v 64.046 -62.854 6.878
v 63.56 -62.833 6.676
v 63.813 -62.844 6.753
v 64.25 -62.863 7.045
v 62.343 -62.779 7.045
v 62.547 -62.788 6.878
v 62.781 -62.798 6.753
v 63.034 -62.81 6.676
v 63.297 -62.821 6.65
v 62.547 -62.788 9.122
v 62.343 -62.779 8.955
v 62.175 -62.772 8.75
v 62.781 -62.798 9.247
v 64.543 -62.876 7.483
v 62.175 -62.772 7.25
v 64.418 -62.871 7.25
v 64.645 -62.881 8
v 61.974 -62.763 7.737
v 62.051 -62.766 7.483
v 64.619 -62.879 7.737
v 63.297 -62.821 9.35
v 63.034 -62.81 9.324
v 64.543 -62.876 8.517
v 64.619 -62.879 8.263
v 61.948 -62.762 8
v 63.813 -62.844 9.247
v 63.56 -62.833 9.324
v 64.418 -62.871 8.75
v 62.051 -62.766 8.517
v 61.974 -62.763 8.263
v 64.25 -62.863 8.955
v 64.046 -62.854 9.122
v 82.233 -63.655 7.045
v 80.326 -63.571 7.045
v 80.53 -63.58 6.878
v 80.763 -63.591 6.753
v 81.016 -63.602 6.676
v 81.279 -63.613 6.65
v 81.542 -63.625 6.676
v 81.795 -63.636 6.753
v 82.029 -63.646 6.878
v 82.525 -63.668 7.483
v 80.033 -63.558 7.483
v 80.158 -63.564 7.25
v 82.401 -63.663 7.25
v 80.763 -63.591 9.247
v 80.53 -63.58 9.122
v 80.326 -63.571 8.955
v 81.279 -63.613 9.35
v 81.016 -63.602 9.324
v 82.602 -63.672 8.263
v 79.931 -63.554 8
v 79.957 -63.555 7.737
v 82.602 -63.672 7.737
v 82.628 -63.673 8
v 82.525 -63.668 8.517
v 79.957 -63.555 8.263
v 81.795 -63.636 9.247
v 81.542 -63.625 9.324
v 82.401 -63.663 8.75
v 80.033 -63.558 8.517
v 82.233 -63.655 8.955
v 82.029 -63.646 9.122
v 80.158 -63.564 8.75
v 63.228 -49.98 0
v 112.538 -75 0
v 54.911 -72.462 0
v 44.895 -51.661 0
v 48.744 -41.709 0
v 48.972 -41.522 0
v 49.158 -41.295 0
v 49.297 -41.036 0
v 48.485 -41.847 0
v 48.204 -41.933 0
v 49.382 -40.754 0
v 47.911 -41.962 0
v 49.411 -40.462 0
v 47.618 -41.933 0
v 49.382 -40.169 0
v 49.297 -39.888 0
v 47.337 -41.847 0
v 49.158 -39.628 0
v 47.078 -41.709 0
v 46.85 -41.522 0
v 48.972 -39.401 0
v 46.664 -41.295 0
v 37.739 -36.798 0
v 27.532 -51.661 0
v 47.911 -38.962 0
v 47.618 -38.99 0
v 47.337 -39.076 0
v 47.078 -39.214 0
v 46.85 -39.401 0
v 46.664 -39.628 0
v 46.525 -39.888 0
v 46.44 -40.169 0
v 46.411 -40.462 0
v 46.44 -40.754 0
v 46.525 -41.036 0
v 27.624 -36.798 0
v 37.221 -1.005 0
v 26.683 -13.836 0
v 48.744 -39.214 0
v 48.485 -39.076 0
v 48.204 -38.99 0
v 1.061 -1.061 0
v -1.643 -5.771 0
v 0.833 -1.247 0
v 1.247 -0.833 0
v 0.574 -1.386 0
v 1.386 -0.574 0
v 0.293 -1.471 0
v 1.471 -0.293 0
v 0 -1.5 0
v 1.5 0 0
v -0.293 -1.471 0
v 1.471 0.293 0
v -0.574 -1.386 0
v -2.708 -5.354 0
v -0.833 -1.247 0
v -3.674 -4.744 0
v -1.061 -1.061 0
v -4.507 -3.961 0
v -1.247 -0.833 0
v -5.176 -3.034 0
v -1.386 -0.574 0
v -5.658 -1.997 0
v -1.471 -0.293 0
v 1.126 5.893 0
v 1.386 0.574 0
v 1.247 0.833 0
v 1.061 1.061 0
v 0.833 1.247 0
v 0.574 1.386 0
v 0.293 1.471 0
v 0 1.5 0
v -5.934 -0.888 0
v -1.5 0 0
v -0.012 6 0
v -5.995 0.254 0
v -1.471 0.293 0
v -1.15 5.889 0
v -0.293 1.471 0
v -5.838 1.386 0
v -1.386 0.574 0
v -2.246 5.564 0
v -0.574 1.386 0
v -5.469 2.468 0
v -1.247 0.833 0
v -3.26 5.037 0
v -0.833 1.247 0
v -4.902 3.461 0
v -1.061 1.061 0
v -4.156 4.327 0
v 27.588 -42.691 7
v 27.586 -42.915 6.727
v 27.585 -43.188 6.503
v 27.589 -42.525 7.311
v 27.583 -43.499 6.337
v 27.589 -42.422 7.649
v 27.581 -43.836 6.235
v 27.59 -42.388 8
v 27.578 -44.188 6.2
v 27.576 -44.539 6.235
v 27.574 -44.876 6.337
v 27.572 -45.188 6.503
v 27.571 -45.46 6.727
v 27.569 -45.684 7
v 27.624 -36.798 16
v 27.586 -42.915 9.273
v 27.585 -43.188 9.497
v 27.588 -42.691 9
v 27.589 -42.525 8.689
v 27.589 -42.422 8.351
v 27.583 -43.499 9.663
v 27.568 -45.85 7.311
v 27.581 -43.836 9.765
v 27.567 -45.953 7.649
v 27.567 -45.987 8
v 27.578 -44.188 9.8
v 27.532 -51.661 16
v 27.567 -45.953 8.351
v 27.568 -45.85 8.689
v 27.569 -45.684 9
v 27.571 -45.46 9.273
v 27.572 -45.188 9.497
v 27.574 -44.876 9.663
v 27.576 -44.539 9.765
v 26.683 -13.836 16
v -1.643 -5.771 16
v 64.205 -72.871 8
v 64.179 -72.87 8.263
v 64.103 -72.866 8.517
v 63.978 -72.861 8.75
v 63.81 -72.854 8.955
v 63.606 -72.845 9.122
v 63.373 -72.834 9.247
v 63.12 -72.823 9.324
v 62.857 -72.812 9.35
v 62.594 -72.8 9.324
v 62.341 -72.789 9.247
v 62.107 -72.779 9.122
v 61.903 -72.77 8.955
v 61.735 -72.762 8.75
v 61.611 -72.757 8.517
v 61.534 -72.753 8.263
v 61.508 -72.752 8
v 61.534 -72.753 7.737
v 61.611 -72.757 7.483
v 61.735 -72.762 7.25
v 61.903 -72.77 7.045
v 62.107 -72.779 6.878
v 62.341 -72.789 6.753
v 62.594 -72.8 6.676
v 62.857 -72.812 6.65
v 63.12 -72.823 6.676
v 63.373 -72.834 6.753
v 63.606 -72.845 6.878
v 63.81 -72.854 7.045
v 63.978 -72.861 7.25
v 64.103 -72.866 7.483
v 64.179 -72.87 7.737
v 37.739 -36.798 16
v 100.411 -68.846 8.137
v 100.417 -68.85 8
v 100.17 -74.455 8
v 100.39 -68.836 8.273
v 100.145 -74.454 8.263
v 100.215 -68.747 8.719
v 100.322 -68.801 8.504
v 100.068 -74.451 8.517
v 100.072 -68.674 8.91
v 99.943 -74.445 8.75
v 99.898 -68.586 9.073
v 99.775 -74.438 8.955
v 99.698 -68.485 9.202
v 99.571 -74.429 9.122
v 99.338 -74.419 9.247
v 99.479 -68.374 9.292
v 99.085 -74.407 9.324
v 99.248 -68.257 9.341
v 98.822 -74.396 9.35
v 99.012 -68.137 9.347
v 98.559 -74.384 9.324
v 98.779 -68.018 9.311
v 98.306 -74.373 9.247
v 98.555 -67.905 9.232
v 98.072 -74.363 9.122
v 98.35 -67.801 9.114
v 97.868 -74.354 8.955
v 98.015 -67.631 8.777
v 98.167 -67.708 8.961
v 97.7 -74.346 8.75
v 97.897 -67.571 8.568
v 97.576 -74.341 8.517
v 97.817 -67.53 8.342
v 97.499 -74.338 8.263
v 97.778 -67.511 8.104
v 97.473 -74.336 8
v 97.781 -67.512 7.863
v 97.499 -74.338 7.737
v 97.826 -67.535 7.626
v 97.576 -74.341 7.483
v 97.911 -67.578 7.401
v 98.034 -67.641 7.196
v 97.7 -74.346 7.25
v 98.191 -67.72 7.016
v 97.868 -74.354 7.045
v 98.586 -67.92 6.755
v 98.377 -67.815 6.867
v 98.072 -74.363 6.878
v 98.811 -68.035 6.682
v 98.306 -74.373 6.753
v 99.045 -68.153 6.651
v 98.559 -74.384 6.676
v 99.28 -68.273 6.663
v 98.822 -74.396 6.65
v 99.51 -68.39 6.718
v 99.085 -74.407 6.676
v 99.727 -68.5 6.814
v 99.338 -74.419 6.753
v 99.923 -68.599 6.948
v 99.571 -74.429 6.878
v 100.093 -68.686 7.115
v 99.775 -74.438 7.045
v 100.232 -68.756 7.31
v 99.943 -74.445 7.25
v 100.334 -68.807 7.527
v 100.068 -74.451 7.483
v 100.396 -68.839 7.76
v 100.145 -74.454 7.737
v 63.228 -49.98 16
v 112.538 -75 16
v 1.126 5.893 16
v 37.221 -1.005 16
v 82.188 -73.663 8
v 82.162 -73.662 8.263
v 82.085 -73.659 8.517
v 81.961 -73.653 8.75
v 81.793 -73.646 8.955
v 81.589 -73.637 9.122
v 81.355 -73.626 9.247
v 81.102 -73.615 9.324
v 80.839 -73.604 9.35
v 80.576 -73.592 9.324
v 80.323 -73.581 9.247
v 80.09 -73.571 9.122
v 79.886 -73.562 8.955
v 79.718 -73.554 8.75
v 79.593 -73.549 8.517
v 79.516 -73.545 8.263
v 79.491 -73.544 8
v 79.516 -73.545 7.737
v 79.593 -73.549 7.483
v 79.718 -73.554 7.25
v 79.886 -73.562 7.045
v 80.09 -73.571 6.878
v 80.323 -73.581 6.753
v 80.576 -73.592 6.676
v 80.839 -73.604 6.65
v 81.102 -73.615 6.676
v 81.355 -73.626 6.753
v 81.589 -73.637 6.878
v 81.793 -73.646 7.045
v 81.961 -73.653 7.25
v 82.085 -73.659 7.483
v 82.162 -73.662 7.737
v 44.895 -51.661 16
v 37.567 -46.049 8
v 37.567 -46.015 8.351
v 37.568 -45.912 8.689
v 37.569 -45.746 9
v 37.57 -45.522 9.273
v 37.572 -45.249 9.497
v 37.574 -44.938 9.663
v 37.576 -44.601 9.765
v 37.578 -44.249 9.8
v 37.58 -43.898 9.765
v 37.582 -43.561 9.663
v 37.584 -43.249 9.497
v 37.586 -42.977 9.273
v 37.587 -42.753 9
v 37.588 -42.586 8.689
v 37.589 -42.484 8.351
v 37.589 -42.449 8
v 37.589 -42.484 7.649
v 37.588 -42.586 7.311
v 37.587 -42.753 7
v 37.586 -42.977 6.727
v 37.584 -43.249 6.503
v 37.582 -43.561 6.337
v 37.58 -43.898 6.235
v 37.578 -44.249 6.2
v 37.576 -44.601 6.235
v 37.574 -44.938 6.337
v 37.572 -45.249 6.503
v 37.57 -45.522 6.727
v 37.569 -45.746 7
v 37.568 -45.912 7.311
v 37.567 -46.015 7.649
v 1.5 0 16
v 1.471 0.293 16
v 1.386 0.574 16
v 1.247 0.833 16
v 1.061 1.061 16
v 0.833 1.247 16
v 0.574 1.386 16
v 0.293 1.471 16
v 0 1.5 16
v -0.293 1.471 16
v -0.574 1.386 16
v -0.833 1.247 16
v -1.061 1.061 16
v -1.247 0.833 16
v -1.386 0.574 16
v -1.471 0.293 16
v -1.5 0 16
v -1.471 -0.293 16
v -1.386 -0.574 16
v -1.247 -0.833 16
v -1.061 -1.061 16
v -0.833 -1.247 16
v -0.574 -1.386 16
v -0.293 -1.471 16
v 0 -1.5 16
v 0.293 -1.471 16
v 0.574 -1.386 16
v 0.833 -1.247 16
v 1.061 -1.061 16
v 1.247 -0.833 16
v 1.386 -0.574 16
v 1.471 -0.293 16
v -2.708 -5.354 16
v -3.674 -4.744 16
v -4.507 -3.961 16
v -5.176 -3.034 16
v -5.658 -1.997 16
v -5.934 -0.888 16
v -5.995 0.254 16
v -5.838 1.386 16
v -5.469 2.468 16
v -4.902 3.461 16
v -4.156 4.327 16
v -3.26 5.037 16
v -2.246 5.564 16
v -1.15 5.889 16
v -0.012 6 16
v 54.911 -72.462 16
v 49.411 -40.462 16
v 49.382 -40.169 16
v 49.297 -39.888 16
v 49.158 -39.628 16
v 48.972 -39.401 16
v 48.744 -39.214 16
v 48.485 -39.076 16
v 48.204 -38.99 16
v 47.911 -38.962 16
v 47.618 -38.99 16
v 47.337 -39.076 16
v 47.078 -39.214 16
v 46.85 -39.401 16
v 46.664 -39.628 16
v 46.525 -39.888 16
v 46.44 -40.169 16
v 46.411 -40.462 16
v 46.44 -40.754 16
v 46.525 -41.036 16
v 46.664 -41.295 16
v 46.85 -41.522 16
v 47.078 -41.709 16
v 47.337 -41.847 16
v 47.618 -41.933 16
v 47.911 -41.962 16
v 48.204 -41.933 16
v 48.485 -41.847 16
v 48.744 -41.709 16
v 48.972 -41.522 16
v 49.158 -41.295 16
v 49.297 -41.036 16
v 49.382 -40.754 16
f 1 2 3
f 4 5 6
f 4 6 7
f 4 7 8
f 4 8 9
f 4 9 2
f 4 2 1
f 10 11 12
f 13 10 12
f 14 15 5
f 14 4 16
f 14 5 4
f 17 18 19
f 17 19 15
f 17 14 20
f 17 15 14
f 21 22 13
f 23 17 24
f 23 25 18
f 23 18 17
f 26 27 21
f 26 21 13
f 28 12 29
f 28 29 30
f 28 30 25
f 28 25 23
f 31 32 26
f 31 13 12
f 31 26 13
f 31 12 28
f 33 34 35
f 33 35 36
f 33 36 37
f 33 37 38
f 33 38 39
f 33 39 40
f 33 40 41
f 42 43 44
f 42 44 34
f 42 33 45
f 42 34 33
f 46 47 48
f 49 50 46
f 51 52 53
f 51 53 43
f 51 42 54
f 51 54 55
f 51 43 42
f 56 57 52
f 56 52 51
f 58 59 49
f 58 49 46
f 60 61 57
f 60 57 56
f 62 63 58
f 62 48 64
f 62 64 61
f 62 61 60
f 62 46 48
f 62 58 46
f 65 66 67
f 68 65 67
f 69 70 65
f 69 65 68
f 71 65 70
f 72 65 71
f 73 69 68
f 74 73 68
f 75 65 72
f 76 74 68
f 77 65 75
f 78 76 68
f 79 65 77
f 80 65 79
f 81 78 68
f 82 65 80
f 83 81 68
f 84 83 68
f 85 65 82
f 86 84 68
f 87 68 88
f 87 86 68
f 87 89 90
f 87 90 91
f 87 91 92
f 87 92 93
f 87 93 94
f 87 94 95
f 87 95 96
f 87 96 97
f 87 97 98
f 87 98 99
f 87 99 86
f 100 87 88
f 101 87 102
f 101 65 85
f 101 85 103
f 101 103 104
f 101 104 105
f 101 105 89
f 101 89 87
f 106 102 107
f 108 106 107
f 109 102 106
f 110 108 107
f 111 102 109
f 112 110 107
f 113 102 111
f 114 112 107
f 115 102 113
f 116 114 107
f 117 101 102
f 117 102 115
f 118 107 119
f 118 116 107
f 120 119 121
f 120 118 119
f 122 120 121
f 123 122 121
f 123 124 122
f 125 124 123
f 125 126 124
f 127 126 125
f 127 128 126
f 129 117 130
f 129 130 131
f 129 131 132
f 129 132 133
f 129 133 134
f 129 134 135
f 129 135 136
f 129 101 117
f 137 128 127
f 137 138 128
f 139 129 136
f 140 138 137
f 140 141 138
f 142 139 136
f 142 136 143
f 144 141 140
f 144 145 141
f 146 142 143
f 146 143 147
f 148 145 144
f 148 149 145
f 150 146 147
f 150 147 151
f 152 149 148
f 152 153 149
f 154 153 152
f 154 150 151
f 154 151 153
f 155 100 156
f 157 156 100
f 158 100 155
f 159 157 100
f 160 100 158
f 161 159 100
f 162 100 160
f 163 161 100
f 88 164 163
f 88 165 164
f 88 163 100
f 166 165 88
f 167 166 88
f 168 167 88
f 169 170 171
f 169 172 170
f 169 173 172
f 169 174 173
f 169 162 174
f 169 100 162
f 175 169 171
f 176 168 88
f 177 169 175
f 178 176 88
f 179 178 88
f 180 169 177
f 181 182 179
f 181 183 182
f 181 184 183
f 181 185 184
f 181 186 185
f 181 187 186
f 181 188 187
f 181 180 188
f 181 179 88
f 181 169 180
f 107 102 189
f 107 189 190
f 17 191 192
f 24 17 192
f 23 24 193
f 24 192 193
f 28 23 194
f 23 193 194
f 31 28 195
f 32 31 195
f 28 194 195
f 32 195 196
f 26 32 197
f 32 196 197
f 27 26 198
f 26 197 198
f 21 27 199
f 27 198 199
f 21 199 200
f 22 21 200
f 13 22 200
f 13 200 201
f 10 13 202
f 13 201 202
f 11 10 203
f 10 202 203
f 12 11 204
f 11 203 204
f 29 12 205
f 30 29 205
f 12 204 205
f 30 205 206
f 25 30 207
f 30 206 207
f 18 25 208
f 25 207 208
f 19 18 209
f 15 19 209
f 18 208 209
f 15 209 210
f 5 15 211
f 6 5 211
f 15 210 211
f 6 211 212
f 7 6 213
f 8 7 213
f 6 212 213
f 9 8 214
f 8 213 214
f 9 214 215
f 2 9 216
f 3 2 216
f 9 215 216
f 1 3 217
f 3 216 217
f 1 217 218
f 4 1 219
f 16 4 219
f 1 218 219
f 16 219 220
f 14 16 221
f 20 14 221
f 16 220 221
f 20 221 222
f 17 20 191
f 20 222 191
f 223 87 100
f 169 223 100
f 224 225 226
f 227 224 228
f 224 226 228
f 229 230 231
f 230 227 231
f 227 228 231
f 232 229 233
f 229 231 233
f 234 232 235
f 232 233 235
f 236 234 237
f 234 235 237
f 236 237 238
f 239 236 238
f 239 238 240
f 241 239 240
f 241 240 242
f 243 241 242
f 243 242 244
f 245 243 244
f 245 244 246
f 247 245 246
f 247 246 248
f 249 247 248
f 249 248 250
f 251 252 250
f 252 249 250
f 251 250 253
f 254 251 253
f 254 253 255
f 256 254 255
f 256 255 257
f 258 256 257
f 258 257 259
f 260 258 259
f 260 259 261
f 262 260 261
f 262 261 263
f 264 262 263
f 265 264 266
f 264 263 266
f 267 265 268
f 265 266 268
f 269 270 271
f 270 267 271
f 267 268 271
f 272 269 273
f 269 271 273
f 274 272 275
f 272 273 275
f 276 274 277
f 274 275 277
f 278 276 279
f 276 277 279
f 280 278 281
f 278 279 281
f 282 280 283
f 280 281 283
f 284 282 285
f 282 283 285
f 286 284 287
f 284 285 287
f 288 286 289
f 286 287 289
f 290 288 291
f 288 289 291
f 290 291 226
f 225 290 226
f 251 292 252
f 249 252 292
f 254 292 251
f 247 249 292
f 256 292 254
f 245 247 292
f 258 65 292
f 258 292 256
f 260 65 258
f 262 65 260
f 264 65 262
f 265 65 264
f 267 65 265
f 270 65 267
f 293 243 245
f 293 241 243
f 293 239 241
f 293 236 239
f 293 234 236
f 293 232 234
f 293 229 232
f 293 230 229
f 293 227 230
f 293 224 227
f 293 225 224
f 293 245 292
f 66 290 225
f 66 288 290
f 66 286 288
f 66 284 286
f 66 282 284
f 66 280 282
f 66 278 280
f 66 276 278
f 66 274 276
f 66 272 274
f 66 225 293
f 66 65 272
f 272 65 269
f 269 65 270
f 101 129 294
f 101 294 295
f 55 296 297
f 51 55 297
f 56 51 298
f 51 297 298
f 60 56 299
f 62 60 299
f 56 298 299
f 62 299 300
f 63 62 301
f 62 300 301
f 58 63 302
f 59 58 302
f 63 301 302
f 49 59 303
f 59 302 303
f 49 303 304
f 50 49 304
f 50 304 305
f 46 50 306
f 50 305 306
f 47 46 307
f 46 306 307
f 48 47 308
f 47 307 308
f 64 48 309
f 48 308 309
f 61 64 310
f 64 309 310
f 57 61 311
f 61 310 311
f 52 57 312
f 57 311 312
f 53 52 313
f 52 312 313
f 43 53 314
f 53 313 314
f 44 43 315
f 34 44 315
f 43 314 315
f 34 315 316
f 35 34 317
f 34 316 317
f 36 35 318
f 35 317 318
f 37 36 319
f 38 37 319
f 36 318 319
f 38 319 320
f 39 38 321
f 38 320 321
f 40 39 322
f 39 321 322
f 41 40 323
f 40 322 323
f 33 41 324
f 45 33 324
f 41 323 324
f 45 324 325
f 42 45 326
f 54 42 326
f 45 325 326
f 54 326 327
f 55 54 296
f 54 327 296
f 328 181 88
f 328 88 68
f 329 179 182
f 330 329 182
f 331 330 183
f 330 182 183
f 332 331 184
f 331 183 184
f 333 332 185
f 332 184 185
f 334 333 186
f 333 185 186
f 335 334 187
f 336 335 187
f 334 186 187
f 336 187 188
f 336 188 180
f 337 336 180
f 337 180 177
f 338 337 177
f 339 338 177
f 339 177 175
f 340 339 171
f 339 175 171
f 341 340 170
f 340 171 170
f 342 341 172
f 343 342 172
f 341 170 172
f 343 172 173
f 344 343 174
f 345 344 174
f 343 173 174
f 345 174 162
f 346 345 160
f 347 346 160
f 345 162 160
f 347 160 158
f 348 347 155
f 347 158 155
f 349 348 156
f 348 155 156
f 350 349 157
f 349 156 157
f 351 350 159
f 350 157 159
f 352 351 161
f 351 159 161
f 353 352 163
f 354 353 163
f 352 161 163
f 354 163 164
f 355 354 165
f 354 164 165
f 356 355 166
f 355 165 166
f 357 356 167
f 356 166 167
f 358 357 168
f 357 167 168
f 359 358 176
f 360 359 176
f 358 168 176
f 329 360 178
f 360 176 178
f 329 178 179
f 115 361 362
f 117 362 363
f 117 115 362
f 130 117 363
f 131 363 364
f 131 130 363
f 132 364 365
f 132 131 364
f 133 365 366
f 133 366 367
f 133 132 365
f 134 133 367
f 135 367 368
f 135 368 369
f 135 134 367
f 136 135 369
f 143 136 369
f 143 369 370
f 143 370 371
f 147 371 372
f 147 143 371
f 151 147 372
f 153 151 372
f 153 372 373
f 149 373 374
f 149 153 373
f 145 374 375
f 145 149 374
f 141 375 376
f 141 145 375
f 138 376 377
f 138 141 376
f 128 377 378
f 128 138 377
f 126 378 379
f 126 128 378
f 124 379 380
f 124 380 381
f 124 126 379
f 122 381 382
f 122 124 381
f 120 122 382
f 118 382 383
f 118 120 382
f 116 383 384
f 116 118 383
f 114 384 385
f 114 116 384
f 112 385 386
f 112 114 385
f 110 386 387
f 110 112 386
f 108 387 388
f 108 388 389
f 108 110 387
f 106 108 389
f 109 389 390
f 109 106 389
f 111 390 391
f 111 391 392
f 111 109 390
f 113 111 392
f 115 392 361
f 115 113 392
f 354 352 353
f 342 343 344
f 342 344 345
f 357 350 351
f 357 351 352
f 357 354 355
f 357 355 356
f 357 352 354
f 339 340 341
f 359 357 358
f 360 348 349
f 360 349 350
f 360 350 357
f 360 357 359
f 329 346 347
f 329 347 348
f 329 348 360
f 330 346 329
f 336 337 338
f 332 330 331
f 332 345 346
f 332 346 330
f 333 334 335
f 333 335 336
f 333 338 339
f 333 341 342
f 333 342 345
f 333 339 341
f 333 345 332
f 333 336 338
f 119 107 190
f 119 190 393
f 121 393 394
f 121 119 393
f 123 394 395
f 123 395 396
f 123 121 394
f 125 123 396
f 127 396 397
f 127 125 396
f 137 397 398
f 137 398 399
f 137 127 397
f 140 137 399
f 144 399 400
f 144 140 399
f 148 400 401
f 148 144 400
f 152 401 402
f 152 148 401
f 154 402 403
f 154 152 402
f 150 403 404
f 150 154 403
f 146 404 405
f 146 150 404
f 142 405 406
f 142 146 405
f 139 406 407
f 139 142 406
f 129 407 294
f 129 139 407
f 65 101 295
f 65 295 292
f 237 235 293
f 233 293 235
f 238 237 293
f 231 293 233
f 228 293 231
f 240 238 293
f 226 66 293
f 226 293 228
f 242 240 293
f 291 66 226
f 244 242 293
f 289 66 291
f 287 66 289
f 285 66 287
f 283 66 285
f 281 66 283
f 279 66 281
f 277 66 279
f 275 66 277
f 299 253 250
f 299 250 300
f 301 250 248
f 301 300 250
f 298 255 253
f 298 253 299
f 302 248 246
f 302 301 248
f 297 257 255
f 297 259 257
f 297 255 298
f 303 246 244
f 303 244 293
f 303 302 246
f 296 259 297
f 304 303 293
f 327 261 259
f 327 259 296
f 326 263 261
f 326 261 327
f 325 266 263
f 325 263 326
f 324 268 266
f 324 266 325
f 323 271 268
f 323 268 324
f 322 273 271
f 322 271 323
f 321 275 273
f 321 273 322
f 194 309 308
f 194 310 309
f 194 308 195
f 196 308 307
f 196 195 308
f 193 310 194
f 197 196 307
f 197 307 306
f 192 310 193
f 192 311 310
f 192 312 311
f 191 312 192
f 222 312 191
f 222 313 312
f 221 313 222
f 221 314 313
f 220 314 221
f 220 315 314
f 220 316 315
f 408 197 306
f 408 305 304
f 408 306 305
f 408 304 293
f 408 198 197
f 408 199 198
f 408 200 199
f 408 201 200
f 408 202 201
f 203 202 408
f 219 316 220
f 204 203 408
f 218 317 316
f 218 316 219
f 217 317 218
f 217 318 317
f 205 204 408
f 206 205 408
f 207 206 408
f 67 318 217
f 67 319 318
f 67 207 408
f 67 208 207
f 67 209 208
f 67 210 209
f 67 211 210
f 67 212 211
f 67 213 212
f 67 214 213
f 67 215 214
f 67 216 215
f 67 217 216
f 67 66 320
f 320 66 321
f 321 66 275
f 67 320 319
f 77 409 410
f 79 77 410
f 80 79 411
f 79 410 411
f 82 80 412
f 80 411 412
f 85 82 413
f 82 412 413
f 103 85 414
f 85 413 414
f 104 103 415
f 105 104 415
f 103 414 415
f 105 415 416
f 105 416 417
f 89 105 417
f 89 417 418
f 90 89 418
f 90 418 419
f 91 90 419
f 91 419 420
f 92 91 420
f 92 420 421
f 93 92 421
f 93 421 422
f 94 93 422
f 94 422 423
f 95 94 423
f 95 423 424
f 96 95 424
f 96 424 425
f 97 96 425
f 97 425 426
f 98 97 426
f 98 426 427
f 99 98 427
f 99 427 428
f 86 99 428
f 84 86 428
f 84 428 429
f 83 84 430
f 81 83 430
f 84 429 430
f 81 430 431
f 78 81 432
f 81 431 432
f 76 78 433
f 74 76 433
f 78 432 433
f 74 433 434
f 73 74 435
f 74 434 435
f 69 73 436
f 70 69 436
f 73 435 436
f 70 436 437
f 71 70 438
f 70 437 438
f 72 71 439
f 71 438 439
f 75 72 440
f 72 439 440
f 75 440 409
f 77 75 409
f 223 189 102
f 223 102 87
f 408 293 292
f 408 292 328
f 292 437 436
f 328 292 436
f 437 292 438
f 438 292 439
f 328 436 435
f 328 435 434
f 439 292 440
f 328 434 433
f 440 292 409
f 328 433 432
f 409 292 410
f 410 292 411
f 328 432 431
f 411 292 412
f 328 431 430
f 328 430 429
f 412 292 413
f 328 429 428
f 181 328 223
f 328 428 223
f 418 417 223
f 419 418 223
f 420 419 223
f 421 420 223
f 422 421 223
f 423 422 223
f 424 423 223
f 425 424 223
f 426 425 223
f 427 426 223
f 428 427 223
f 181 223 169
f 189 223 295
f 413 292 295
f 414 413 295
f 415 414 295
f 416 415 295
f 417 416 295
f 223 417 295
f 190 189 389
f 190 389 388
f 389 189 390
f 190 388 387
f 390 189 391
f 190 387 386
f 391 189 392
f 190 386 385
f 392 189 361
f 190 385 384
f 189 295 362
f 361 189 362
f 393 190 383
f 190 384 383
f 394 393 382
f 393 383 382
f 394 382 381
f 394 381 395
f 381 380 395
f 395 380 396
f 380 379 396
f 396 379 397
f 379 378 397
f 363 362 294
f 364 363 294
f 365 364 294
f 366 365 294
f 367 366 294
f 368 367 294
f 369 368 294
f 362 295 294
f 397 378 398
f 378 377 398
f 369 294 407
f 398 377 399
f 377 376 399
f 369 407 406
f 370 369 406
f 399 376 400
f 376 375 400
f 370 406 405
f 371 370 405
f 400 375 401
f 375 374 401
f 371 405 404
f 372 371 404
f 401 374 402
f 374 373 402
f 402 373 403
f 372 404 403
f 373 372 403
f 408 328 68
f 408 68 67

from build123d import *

# Parameters (mm, degrees)
SKETCH_1_R          = 1.5
EXTRUDE_1_DEPTH     = 16
SKETCH_2_R          = 1.35
CUT_EXTRUDE_1_DEPTH = 10
CUT_EXTRUDE_2_DEPTH = 33
EXTRUDE_2_DEPTH     = 16
SKETCH_5_R          = 1.5
CUT_EXTRUDE_3_DEPTH = 24
SKETCH_7_R          = 1.8
CUT_EXTRUDE_5_DEPTH = 10


with BuildPart() as part:
    # 草图1 → 凸台-拉伸1 (new body)
    with BuildSketch(Plane.XY):
        with BuildLine():
            Line((1.126380295, 5.893323971), (37.220974686, -1.005370225))
            Line((37.220974686, -1.005370225), (63.227984205, -49.979924472))
            Line((63.227984205, -49.979924472), (112.538061605, -75))
            Line((112.538061605, -75), (53.330616959, -72.391905084))
            Line((53.330616959, -72.391905084), (49.915441771, -64.88738307))
            Line((49.915441771, -64.88738307), (26.682733599, -13.835720919))
            Line((26.682733599, -13.835720919), (-1.643050648, -5.77064854))
            ThreePointArc((-1.643050648, -5.77064854), (-5.837705093, 1.386073321), (1.126380295, 5.893323971))
        make_face()
        Circle(SKETCH_1_R, mode=Mode.SUBTRACT)
    extrude(amount=EXTRUDE_1_DEPTH)

    # 草图2 → 切除-拉伸1 (cut)
    with BuildSketch(Plane(origin=(-3.079413203, -69.907036606, 0), x_dir=(0.9990312032291818, -0.044007442262116094, 0), z_dir=(-0.044007442262116094, -0.9990312032291818, 0))):
        with Locations((66, 8)):
            Circle(SKETCH_2_R)
        with Locations((102, 8)):
            Circle(SKETCH_2_R)
        with Locations((84, 8)):
            Circle(SKETCH_2_R)
    extrude(amount=-CUT_EXTRUDE_1_DEPTH, mode=Mode.SUBTRACT)

    # 草图3 → 切除-拉伸2 (cut)
    with BuildSketch(Plane.XY.offset(16)):
        Polygon((26.682733599, -13.835720919), (54.911117554, -72.461526322), (53.330616959, -72.391905084), align=None)
    extrude(amount=-CUT_EXTRUDE_2_DEPTH, mode=Mode.SUBTRACT)

    # 草图4 → 凸台-拉伸2 (add)
    with BuildSketch(Plane.XY.offset(16)):
        Polygon((44.895473102, -51.660646486), (37.739057149, -36.797923572), (27.624132339, -36.797923572), (27.532134383, -51.660646486), align=None)
    extrude(amount=-EXTRUDE_2_DEPTH)

    # 草图5 → 切除-拉伸3 (cut)
    with BuildSketch(Plane.XY.offset(16)):
        with Locations((47.911117554, -40.461526322)):
            Circle(SKETCH_5_R)
    extrude(amount=-CUT_EXTRUDE_3_DEPTH, mode=Mode.SUBTRACT)

    # 草图7 → 切除-拉伸5 (cut)
    with BuildSketch(Plane(origin=(27.85083871, -0.172392383, 0), x_dir=(0, 0, 1), z_dir=(-0.9999808434581536, 0.006189726708003564, 0))):
        with Locations(Location((8, -44.015961614, 0), (0, 0, 270))):
            Circle(SKETCH_7_R)
    extrude(amount=-CUT_EXTRUDE_5_DEPTH, mode=Mode.SUBTRACT)


solid = part.part
